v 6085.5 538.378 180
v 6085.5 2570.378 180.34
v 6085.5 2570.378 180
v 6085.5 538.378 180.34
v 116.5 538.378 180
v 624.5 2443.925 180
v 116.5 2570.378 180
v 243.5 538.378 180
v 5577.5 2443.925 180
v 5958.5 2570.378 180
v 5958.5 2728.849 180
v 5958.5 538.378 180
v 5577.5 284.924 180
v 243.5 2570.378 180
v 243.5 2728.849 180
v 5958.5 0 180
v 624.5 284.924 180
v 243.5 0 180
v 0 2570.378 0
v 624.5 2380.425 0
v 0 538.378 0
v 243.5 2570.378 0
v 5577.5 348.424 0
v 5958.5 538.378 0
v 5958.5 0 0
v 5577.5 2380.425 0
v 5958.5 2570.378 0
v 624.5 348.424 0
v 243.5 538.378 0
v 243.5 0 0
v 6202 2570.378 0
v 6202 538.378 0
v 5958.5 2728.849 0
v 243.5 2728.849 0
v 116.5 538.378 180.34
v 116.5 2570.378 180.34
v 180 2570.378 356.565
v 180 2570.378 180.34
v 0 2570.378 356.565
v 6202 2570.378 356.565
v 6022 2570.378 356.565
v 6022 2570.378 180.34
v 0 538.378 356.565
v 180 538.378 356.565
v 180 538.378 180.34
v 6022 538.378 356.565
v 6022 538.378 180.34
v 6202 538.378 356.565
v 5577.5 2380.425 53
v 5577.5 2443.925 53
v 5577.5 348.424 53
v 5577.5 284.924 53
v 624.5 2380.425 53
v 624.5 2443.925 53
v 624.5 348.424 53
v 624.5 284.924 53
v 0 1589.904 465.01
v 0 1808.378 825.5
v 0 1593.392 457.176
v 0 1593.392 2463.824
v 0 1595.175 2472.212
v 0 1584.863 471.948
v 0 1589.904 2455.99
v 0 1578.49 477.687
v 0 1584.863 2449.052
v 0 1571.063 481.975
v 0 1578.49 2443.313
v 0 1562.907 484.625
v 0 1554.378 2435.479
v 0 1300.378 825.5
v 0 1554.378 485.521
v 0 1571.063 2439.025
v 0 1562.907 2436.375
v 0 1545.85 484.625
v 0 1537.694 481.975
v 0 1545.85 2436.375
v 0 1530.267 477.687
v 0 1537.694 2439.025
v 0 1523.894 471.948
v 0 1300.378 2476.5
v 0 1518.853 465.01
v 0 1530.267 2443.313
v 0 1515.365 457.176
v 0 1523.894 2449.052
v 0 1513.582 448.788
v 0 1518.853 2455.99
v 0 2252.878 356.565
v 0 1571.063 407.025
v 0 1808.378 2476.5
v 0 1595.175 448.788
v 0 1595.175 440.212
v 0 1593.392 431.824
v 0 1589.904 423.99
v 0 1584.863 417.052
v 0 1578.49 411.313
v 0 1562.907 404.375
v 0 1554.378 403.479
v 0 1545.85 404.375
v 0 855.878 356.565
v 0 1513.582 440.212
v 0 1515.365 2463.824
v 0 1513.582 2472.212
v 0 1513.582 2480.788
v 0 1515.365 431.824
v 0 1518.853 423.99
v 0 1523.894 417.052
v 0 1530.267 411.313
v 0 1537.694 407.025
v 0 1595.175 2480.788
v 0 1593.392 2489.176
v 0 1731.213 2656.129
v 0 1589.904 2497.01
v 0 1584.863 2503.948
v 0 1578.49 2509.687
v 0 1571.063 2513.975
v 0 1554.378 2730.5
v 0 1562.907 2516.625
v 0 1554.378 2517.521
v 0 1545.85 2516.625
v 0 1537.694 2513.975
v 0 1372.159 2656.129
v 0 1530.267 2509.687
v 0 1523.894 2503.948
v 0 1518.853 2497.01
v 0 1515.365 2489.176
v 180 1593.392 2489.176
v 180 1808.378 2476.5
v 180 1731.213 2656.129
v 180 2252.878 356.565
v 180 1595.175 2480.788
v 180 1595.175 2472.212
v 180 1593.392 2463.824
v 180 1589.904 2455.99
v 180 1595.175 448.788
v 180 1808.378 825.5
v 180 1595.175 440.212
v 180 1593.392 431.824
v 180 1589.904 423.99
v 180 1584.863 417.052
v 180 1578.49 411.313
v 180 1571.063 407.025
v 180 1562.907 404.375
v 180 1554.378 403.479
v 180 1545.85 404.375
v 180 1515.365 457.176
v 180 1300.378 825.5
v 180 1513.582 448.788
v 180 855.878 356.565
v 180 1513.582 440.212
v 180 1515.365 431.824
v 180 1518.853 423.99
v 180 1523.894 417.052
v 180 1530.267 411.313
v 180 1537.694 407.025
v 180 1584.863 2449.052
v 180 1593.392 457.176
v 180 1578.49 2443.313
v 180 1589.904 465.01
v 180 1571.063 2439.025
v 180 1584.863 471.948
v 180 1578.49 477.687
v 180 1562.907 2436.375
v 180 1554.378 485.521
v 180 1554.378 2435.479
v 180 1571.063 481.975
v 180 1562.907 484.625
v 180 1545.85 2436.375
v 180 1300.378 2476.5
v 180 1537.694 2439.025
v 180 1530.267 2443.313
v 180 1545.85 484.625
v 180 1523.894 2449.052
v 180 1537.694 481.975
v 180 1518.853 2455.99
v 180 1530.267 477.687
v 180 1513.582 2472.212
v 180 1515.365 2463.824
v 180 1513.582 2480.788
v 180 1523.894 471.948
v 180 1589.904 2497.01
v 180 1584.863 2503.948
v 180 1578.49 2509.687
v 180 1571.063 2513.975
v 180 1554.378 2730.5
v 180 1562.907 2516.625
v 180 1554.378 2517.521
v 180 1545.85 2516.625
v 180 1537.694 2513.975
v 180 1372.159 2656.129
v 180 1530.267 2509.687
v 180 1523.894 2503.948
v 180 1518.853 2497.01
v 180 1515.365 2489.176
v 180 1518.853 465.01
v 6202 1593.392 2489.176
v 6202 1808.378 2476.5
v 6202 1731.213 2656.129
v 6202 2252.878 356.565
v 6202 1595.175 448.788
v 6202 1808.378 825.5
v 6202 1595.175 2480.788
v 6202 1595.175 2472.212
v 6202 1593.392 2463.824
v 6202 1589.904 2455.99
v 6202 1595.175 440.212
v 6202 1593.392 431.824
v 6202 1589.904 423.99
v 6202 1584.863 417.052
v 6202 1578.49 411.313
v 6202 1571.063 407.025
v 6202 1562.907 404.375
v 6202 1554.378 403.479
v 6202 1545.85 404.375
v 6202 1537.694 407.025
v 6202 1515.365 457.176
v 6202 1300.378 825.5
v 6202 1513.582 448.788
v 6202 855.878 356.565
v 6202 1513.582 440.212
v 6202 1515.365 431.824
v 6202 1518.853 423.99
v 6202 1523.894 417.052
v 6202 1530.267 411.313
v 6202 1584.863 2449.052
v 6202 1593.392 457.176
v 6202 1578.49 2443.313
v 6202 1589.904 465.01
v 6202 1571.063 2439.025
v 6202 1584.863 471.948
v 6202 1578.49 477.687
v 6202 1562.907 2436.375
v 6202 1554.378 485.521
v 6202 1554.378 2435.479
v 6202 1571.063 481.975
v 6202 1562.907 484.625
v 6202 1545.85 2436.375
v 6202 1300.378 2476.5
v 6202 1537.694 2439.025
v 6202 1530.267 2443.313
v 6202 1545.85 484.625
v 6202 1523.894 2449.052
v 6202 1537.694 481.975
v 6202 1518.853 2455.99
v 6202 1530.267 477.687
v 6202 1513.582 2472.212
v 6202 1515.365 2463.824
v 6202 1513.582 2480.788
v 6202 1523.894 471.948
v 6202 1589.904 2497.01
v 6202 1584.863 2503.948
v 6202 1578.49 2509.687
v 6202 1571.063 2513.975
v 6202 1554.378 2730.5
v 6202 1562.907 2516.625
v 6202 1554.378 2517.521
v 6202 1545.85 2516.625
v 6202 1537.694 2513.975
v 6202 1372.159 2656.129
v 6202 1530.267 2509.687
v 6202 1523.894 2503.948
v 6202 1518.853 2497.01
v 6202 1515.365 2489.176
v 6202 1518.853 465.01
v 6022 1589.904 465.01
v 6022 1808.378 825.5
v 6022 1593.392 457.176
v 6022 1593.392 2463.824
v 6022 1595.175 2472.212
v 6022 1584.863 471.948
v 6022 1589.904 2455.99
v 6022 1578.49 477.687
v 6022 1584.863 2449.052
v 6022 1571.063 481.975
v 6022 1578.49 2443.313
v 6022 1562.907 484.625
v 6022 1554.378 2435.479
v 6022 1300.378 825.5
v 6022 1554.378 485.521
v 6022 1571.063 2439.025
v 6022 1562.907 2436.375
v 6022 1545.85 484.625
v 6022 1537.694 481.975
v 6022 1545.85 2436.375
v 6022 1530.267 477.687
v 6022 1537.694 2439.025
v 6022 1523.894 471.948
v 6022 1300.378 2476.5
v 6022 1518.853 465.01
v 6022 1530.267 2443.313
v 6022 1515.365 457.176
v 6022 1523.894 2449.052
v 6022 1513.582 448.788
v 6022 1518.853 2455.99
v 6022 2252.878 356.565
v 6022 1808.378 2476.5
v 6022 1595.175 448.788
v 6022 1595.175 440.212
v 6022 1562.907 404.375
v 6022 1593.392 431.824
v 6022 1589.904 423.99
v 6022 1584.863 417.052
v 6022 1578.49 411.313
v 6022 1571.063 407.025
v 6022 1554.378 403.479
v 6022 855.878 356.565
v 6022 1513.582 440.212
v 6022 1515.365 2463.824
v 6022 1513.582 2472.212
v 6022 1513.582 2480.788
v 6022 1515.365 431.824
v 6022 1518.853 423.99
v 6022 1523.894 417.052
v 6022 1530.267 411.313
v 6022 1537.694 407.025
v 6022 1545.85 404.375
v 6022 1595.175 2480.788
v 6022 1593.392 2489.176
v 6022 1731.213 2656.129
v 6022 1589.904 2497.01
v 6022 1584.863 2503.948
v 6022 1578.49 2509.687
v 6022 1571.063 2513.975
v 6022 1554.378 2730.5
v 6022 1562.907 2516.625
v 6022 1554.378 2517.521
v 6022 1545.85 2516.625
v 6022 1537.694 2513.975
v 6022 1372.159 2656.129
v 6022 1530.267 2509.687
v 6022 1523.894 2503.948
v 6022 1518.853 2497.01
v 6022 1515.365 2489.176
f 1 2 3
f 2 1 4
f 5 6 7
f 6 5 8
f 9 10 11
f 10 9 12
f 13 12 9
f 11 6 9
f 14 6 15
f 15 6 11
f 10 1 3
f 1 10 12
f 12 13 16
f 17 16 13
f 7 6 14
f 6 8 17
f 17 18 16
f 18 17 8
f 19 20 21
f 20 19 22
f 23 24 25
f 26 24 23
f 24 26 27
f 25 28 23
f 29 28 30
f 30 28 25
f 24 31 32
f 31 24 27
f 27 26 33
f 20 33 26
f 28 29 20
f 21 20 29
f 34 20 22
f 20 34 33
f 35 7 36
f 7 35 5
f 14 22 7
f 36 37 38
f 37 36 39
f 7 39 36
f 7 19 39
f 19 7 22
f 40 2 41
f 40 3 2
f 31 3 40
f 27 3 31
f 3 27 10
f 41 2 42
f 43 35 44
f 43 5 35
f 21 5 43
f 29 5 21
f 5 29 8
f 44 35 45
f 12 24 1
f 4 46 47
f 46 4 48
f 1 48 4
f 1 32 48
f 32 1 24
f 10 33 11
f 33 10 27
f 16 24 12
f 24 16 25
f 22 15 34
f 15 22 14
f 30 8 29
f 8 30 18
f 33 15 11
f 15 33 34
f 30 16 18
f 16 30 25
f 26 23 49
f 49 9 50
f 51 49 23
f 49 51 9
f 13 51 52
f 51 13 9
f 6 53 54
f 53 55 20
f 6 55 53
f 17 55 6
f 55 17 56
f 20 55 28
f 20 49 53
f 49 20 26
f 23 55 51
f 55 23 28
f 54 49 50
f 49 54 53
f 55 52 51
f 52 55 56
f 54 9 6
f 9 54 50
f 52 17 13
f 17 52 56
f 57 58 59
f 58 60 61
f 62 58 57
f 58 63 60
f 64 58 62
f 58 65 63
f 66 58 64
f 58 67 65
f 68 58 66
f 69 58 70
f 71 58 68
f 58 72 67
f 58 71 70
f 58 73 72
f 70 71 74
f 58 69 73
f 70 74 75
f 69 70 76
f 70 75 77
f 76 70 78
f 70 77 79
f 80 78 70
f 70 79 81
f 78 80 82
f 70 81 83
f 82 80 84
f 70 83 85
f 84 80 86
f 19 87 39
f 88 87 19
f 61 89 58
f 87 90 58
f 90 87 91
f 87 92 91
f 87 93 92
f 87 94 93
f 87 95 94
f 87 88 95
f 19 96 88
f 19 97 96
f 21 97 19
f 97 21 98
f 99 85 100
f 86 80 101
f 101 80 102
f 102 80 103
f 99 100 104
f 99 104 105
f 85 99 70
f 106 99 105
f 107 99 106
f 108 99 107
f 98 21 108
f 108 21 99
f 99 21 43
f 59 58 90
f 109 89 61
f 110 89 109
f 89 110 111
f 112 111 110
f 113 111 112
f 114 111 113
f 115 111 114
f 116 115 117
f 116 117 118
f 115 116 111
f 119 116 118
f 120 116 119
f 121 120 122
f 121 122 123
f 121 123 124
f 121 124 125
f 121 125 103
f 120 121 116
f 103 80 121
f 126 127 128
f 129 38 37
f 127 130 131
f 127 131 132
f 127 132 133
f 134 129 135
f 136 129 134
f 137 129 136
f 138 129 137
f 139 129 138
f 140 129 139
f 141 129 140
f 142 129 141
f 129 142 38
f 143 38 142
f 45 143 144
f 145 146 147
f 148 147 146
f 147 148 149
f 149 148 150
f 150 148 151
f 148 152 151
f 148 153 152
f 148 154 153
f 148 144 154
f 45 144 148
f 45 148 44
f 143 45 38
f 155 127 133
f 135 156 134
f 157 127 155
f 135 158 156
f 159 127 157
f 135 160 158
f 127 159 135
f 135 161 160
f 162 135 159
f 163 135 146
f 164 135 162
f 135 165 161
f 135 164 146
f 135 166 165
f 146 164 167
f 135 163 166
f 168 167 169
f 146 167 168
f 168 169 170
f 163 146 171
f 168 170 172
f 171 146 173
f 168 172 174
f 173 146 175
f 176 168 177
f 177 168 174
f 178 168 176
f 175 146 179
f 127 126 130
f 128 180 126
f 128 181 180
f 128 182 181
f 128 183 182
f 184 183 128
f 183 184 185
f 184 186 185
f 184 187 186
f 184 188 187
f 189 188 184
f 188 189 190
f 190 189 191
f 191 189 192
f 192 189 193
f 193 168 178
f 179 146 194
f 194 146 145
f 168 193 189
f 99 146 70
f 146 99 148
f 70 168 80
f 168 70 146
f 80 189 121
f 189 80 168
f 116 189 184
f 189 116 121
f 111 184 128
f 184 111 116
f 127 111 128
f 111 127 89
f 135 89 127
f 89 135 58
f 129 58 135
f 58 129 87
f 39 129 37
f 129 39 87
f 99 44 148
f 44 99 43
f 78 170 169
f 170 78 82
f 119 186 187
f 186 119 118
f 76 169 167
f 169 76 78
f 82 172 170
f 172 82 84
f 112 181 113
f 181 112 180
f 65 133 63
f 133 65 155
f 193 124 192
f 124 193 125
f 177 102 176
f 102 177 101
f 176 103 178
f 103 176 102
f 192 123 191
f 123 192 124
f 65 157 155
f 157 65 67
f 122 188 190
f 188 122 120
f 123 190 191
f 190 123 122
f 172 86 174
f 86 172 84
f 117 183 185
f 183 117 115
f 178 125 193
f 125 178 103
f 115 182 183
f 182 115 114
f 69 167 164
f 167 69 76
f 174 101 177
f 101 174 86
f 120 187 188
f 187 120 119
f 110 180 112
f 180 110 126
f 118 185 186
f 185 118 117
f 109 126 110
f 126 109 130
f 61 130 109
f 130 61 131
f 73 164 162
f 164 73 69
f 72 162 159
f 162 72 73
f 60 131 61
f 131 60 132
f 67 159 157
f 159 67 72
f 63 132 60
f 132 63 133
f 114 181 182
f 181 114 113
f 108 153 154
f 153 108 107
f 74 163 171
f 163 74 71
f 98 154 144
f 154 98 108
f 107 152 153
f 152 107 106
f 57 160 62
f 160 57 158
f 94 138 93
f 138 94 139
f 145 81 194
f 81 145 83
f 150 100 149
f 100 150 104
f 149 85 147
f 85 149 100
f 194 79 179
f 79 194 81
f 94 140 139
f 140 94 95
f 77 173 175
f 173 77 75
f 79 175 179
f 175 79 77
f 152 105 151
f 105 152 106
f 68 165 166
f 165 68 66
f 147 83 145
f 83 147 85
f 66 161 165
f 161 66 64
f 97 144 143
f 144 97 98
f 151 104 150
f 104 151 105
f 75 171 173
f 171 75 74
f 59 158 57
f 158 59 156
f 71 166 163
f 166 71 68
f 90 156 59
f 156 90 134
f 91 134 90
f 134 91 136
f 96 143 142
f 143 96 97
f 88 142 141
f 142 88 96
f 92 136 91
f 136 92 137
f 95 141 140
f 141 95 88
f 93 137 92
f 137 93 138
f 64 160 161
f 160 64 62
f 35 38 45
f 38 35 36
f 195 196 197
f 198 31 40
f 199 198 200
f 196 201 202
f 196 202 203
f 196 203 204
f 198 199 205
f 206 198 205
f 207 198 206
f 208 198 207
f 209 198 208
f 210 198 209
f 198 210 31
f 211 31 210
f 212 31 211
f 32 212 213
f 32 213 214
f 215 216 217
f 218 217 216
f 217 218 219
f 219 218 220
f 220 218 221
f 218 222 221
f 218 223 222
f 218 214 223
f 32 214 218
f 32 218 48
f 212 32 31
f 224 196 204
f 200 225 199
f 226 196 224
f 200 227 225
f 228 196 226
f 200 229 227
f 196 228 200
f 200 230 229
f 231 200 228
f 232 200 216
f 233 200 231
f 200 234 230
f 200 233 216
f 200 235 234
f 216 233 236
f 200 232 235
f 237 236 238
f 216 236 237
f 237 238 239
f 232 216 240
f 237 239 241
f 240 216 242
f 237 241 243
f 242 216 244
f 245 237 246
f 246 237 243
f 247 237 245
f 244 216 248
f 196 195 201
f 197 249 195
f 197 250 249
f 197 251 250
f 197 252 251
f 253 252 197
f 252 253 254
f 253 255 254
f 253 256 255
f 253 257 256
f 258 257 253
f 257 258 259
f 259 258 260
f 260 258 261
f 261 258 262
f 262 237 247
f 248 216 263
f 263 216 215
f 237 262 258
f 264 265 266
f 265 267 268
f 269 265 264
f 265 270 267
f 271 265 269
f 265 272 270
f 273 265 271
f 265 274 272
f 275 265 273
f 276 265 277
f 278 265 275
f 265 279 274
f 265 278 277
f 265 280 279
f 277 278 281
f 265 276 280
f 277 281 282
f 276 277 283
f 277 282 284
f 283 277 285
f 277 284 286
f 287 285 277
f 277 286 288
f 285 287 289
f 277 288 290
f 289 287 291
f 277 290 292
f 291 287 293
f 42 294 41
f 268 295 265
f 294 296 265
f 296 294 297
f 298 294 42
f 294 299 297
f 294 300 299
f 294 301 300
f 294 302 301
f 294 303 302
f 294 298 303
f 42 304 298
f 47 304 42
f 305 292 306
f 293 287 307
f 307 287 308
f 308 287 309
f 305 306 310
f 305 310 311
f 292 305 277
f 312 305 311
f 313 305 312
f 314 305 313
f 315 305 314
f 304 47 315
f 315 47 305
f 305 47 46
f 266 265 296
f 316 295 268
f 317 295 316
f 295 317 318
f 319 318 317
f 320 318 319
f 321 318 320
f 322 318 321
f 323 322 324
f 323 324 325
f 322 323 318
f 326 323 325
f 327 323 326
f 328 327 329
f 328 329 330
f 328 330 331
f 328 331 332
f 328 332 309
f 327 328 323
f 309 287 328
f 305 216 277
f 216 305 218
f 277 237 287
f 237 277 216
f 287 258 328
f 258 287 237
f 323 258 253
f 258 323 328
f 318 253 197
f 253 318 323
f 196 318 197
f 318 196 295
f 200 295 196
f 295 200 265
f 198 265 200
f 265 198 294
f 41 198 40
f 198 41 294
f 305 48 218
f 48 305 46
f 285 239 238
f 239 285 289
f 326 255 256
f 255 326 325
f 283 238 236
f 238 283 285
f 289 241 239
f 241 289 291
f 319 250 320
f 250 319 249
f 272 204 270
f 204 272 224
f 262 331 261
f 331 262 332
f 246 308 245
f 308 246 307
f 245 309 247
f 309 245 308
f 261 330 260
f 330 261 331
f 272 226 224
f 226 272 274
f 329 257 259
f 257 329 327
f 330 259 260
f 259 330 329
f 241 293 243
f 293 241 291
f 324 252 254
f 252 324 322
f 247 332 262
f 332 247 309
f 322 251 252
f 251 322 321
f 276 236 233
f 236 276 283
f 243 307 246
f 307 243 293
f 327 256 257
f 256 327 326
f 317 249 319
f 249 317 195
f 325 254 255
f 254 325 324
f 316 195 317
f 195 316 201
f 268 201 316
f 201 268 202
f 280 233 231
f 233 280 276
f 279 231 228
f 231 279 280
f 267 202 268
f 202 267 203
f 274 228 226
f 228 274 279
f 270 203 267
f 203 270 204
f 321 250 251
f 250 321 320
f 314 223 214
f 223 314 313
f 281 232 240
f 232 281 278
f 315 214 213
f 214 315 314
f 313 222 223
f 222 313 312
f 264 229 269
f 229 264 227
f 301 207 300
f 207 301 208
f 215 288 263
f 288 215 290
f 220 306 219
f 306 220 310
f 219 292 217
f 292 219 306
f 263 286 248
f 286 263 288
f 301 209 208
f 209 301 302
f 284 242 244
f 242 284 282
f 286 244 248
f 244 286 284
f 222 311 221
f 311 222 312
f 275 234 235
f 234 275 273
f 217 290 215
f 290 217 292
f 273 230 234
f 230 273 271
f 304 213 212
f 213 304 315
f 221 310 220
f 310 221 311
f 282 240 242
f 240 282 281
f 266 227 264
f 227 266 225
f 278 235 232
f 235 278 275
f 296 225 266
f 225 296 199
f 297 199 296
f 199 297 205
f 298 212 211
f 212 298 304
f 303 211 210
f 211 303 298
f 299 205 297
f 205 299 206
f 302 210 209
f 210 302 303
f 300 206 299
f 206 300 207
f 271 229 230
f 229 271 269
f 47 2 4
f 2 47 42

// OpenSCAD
// file: cradle_lift_arm.scad
// To render the DXF file from the command line:
// openscad -x cradle_lift_arm.dxf -D'units="metric"' cradle_lift_arm.scad

include <global_constants.scad>;

module cradle_lift_arm() {
  // outside dimensions
  x1=180.34;//.71"
  x2=356.5652;//1.4038
  x3=825.5;//3.25"
  x4=2476.5;//9.75"
  x5=2656.1288;//10.4572"
  x6=2730.5;//10.75"
  x7=444.5;//1.75"
  y1=317.5;//1.25"
  y2=762;//3"
  y3=833.7804;//3.2826"
  y4=1016;//4"
  y5=1192.8348;//4.6962"
  y6=1270;//5"
  y7=1714.5;//6.75"
  y8=2032;//8"


  render(convexity=10){
    difference(){
      linear_extrude(height=sheet_z) polygon([[0,0],[x1,0],[x2,0],[x2,y1],[x3,y2],[x4,y2],[x5,y3],[x6,y4],[x5,y5],[x4,y6],[x3,y6],[x2,y7],[x2,y8],[x1,y8],[0,y8],[0,0]]);
      bolt_circle(x4,y4);
      bolt_circle(x7,y4);
      translate([0,0,sheet_z-cradle_lift_arm_cutout_height]) cube([x1,y8,cradle_lift_arm_cutout_height]);
    }
  }
}
// file: cradle_base.scad
include <global_constants.scad>;

module cradle_base() {

  cradle_base_full_depth=2728.849;//10.7435"
  cradle_base_corner_width=127;//0.5"
  cradle_base_back_corner_depth=158.4706;//0.6239"

  cradle_base_cutout_width=4953;//19.5"
  cradle_base_cutout_depth=2032;//8"
  cradle_base_wheelbase_depth=2159;//8.5"
  cradle_base_wheelbase_height=127;//<todo>

  cradle_base_small_depth_rectangle_depth=cradle_base_full_depth-cradle_base_front_corner_depth-cradle_base_back_corner_depth;

  render(convexity=10){
    difference(){
      //two rectangular blocks define the cradle base
      translate([0,cradle_base_front_corner_depth,0,]){
        union(){
          cube([cradle_base_full_width,cradle_base_small_depth_rectangle_depth,sheet_z]);
          translate([cradle_base_corner_width,-cradle_base_front_corner_depth,0]){
            cube([cradle_base_full_width-2*cradle_base_corner_width,cradle_base_full_depth, sheet_z]);
          }
        }
      }
      //two rectangular cutouts define the hole and the place where the bearings sit in the cradle base
      translate([(cradle_base_full_width-cradle_base_cutout_width)/2,(cradle_base_full_depth-cradle_base_wheelbase_depth)/2,0]){
        union(){
          translate([0,(cradle_base_wheelbase_depth-cradle_base_cutout_depth)/2,0]) cube([cradle_base_cutout_width,cradle_base_cutout_depth,sheet_z]);
          translate([0,0,sheet_z-cradle_base_wheelbase_height]) cube([cradle_base_cutout_width,cradle_base_wheelbase_depth,cradle_base_wheelbase_height]);
        }
      }
    }
  }


}
// file: global_constants.scad
// unit = 0.1 mm
// 1 inch = 25.4 mm = 254 units

// Dimensions

// Sheet dimensions
sheet_x=24400;
sheet_y=12200;
sheet_z=180;

// Circular cnc routing holes
cnc_circle_r=31.750;
module routing_circle(x,y){
  translate([x,y]) linear_extrude(height=sheet_z) circle(cnc_circle_r);
}

bolt_circle_r=41.0210;
module bolt_circle(x,y){
  translate([x,y]) linear_extrude(height=sheet_z) circle(bolt_circle_r);
}

// Conversion
medievaltometric=254;
metrictomedieval=.0039370078;

// Use the metric system by default
// units="medieval";
units="metric";

// Light plate construction
light_plate_support_height=1651;//6.5"
light_plate_support_width=3662.68;//14.42

// Base construction
large_support_depth=3667.4552;//14.4388"
large_support_height=4254.5;//16.75"
small_support_depth=1460.5;
small_support_height=4254.5;
front_brace_width=5842+2*sheet_z;
base_brace_edge_depth=53;

// Cradle construction
cradle_base_full_width=5969;//23.5"
cradle_base_front_corner_depth=538.3784;//2.1196"

cradle_lift_arm_cutout_height=63.5;//.25"
// main file
include <global_constants.scad>;
include <cradle_base.scad>;
include <cradle_lift_arm.scad>;

translate([sheet_z-cradle_lift_arm_cutout_height,0,0]) cradle_base();
translate([0,cradle_base_front_corner_depth,0]) mirror() rotate([0,-90,0]) cradle_lift_arm();

translate([cradle_base_full_width+2*(sheet_z-cradle_lift_arm_cutout_height),cradle_base_front_corner_depth,0]) rotate([0,-90,0]) cradle_lift_arm();
